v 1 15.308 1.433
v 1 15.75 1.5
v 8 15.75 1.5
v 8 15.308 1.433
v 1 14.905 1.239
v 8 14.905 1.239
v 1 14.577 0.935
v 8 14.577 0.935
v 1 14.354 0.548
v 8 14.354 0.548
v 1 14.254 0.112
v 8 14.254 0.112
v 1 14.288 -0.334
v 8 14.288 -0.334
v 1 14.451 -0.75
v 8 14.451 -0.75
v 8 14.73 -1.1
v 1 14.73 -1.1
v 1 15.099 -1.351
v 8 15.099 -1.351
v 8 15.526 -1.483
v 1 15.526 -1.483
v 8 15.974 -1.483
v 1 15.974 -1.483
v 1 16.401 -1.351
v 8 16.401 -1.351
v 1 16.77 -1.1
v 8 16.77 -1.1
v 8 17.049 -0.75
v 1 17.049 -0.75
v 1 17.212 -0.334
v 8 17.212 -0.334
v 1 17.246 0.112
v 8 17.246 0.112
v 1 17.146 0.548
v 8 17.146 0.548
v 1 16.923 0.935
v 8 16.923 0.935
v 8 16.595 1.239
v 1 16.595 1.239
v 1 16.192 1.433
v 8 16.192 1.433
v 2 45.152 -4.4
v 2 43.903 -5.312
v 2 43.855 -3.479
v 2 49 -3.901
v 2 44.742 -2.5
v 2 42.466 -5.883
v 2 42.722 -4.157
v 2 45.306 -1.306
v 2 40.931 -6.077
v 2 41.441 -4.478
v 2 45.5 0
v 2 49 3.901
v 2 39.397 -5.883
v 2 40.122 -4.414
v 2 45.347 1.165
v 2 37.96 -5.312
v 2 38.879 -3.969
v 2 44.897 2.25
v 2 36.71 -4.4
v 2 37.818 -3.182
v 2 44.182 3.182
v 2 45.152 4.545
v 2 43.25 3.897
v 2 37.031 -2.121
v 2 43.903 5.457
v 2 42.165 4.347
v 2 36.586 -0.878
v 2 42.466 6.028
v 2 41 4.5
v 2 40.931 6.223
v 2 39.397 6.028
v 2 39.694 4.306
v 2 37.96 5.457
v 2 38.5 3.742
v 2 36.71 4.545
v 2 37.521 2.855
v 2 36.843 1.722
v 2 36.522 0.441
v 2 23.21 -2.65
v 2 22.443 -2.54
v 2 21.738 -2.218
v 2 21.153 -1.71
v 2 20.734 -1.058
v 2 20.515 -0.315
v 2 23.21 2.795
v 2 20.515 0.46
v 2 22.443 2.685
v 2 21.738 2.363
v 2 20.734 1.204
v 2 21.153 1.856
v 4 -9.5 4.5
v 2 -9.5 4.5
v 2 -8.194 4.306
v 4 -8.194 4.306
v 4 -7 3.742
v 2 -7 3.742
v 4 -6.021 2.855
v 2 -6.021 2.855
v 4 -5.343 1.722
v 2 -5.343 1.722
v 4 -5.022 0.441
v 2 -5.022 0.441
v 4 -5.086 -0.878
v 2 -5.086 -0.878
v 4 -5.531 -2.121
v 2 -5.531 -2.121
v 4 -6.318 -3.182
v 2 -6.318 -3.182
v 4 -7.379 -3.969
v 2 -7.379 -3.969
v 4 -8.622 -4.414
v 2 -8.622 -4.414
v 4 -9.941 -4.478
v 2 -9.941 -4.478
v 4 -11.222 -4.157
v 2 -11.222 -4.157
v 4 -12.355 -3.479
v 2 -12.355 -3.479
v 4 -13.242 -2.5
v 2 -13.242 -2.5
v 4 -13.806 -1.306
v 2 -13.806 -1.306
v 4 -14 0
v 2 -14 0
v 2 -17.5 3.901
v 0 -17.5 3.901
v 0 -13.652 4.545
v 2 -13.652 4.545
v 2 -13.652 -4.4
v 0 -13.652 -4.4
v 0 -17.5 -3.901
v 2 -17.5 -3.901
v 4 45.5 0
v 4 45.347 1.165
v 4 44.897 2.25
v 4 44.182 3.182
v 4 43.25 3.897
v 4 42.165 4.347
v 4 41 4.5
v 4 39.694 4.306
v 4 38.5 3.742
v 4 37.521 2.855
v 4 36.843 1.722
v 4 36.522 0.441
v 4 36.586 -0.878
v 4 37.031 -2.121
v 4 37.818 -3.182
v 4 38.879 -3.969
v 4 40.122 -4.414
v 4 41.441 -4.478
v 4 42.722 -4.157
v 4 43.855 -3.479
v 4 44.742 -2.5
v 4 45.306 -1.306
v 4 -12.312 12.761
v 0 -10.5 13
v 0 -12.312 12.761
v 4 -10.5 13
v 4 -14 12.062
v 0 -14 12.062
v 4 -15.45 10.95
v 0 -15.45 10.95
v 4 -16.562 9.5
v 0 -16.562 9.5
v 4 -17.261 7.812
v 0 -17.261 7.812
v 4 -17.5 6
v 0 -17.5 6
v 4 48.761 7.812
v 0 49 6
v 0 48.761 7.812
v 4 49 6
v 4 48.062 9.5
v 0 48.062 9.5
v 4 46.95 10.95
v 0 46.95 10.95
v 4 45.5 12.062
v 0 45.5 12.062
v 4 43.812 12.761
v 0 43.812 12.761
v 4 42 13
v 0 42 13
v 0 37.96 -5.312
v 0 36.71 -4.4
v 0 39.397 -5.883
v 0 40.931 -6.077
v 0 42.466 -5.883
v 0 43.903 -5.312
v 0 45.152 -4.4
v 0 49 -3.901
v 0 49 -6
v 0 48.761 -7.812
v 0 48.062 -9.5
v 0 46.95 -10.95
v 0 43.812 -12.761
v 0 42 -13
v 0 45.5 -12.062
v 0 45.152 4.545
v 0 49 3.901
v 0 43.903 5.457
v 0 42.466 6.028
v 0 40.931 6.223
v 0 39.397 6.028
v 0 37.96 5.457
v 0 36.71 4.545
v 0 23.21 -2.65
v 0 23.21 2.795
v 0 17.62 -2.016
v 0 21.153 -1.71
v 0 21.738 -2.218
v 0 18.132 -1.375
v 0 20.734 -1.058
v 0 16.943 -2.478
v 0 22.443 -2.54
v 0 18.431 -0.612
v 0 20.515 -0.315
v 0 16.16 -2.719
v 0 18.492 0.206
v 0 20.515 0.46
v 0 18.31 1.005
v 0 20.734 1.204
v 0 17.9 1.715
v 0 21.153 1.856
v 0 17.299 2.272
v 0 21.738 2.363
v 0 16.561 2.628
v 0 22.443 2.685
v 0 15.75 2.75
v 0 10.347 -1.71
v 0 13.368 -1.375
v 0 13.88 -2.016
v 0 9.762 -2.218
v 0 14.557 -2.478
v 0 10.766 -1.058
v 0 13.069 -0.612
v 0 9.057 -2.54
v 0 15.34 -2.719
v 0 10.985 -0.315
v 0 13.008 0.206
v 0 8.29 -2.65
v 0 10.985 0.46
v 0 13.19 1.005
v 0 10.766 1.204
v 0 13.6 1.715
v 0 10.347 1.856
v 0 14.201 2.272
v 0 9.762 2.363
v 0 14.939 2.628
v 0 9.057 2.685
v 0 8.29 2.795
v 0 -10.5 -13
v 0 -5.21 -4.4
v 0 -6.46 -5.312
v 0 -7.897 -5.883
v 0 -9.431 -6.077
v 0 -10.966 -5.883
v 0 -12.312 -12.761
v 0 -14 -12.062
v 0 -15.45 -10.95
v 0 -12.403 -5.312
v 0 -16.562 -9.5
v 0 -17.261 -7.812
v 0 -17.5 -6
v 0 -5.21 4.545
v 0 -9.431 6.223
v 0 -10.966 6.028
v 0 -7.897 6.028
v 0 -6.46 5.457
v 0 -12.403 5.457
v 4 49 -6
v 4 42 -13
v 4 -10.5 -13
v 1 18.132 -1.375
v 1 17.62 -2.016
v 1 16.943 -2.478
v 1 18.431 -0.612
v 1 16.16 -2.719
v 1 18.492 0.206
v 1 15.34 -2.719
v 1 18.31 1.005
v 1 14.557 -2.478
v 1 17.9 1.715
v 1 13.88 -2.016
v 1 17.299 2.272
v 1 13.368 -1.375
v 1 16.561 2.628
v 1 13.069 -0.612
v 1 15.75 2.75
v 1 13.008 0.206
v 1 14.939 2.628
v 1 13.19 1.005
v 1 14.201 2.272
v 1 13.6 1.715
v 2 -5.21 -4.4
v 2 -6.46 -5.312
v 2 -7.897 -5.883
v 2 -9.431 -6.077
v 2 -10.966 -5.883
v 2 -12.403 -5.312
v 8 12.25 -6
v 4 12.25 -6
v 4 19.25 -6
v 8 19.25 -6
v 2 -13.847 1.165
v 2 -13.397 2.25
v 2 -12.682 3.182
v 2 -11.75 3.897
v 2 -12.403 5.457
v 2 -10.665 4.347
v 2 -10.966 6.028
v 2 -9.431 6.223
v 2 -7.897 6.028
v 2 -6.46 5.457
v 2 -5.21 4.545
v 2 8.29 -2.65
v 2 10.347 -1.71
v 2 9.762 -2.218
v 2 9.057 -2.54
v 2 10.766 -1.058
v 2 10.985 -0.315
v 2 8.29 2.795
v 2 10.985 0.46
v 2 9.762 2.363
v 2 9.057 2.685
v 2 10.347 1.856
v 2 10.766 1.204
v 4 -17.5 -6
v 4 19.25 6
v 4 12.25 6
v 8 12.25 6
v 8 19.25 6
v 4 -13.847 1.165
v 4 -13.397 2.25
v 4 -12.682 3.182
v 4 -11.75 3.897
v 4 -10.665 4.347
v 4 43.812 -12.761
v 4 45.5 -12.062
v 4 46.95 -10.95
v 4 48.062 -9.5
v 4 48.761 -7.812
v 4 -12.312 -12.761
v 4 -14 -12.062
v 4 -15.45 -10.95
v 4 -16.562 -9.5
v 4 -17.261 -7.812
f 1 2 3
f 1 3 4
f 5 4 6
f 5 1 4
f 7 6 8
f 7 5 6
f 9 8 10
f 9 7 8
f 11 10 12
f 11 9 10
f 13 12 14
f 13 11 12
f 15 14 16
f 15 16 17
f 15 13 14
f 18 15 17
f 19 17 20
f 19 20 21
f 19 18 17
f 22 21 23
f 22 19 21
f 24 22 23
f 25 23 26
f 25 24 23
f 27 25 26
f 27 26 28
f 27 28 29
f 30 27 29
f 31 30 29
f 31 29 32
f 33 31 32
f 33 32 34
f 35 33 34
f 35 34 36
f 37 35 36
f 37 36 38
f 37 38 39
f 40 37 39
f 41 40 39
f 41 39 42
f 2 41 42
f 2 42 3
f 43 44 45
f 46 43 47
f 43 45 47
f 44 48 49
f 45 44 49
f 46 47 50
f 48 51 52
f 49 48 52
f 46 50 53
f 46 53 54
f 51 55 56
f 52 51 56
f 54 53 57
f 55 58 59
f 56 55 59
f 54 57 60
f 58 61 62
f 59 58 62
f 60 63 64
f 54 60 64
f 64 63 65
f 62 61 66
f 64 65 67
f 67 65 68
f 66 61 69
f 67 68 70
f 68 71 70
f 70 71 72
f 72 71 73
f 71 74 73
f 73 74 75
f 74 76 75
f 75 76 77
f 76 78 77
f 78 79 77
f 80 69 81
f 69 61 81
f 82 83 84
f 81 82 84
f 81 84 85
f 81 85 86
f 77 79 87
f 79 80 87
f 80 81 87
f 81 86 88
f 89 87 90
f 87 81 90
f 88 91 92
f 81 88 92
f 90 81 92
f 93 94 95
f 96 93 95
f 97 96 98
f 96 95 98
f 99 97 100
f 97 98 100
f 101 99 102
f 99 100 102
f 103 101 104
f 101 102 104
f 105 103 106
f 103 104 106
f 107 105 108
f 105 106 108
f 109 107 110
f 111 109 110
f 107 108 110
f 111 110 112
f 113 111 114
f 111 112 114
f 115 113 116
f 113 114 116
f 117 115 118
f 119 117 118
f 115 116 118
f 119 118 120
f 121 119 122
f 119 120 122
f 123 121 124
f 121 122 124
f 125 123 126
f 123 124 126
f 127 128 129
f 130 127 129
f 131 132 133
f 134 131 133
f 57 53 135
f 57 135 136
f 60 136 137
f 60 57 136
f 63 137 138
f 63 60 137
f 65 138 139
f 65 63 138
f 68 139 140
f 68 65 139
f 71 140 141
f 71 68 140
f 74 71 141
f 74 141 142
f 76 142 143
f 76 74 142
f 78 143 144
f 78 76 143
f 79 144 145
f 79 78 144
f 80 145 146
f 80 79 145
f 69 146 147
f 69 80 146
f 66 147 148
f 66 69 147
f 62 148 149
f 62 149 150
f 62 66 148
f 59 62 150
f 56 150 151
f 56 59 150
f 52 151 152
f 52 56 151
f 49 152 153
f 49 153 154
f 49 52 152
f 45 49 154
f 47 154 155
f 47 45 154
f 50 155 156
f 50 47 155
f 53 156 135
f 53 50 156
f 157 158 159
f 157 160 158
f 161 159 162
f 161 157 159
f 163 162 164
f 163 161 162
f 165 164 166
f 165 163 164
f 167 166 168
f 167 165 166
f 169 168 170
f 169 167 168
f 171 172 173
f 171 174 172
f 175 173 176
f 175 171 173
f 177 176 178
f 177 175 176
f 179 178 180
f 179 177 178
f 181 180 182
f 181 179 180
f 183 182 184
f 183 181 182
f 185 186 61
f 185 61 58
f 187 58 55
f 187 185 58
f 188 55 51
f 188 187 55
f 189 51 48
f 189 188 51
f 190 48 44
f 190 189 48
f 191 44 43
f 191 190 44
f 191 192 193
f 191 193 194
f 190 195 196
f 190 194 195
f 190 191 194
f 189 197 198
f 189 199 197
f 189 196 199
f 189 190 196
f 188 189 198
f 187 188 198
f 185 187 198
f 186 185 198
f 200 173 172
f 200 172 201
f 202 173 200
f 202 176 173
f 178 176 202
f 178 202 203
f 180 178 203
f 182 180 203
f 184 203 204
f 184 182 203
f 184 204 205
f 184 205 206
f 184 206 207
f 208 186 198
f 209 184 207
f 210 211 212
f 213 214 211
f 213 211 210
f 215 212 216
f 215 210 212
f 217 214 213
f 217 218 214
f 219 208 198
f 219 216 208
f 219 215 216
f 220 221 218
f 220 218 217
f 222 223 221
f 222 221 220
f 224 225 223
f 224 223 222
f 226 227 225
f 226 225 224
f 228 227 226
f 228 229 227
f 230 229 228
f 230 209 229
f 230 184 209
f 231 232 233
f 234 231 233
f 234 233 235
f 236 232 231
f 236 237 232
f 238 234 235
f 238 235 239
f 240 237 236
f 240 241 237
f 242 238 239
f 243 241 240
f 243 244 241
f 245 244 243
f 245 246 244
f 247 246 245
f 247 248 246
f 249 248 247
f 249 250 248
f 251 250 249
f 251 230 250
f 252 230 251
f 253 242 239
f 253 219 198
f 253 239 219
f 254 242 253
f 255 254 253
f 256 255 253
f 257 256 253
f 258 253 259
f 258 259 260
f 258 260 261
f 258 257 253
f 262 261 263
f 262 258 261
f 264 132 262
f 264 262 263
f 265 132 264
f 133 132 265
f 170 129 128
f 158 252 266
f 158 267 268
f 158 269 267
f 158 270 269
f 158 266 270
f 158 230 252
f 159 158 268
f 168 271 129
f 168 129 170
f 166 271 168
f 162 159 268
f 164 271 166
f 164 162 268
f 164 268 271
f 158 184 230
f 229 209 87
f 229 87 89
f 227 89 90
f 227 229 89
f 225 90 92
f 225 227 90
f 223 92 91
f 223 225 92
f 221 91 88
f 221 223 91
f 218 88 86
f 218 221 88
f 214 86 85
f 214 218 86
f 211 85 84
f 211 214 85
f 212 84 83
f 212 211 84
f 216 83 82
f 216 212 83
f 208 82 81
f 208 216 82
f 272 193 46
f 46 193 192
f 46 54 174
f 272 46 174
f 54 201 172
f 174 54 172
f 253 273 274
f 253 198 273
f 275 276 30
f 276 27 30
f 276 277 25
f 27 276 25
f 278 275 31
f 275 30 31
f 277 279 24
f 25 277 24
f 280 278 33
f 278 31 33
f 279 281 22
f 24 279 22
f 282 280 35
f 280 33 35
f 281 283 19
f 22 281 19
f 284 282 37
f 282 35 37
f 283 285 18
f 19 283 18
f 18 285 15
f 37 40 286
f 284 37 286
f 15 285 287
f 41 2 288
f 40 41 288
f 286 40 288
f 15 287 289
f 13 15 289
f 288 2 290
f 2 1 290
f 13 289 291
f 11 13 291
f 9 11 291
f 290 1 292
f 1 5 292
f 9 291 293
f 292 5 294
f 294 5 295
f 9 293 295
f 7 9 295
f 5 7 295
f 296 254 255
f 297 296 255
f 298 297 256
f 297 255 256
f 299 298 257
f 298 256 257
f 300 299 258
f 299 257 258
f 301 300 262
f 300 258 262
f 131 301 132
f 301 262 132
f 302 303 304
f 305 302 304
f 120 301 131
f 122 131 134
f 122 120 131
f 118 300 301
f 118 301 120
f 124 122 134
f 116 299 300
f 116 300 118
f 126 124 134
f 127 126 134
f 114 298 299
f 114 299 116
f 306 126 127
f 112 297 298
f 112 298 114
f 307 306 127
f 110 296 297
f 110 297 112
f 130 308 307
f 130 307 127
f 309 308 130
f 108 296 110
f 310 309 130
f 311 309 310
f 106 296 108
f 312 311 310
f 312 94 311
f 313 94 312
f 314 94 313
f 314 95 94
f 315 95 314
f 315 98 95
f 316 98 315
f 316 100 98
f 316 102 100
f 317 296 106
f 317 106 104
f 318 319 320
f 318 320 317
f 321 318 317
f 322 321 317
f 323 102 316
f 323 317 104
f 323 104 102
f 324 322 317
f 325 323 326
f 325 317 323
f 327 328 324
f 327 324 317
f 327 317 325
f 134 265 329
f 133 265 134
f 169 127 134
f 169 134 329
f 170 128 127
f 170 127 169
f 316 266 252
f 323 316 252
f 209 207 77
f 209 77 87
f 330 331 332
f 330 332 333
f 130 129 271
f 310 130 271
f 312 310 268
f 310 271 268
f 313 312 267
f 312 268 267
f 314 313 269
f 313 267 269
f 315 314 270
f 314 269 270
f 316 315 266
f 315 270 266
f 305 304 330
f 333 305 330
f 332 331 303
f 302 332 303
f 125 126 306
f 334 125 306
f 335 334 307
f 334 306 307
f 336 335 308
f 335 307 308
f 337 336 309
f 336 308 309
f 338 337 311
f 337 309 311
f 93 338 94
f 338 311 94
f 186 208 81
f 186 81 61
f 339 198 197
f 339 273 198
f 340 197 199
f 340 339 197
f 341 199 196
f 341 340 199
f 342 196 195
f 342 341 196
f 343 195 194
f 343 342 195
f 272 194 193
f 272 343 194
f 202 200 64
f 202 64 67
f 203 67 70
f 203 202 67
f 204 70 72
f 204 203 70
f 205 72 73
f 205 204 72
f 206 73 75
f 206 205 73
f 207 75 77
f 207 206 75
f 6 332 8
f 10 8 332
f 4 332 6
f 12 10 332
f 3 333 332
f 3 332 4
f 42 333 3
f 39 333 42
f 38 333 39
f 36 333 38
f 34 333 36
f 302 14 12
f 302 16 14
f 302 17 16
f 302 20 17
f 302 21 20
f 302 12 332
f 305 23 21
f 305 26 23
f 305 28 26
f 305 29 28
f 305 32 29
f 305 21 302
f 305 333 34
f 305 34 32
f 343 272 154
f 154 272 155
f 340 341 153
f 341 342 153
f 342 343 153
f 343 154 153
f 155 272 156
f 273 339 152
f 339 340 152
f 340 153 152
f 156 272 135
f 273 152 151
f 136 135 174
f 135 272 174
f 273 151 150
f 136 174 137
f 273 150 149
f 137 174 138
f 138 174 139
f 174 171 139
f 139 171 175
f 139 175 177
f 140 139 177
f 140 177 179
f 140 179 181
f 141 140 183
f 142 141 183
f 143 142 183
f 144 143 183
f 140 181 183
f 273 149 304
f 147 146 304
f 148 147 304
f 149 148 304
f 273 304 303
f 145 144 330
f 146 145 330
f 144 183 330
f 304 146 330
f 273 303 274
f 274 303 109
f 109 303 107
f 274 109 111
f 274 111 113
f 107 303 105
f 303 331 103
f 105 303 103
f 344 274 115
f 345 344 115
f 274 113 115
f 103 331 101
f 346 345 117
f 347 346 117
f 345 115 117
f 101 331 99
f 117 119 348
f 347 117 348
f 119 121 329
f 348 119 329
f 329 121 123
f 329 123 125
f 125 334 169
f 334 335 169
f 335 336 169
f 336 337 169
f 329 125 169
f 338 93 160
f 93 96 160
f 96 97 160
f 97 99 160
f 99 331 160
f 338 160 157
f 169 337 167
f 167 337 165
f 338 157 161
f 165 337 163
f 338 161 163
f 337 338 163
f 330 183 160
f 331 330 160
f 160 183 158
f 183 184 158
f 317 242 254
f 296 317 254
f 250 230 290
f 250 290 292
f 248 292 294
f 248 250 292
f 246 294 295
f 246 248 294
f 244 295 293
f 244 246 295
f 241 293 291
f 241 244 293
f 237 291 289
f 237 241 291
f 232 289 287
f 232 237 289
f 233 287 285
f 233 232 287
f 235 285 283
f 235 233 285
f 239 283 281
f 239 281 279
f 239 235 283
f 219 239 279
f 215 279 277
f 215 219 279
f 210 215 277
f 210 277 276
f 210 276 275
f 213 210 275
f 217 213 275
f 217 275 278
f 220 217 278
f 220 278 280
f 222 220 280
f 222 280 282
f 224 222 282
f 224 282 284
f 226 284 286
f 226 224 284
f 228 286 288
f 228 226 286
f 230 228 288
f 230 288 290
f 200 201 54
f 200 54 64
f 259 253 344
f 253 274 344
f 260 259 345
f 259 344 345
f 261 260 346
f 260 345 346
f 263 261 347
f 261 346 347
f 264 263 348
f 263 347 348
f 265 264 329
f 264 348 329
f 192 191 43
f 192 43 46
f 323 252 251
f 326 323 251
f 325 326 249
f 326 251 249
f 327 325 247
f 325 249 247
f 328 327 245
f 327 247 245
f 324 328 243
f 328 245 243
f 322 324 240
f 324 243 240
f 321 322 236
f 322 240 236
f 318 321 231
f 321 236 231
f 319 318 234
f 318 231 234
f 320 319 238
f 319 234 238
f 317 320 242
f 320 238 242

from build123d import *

# Parameters (mm, degrees)
SKETCH_1_W             = 36.75
SKETCH_1_H             = 26
EXTRUDE_1_DEPTH        = 4
CUT_EXTRUDE_1_DEPTH    = 2
FILLET_1_R             = 7
CUT_EXTRUDE_3_DEPTH    = 2
SKETCH_11_W            = 12
SKETCH_11_H            = 7
EXTRUDE_2_DEPTH        = 4
SKETCH_12_R            = 1.5
CUT_EXTRUDE_4_DEPTH    = 8
SKETCH_13_R            = 2.75
CUT_EXTRUDE_5_DEPTH    = 1
FILLET_1_OF_MIRROR_2_R = 7


with BuildPart() as part:
    # Эскиз1 → Бобышка-Вытянуть1 (new body)
    with BuildSketch(Plane(origin=(0, 0, 0), x_dir=(0, -1, 0), z_dir=(-1, 0, 0))):
        with Locations((-0.875, 0)):
            Rectangle(SKETCH_1_W, SKETCH_1_H)
    extrude_1 = extrude(amount=-EXTRUDE_1_DEPTH)

    # Эскиз2 → Вырез-Вытянуть1 (cut)
    with BuildSketch(Plane.ZY):
        with BuildLine():
            Line((3.901238196, -17.5), (4.545454545, -13.652408939))
            ThreePointArc((4.545454545, -13.652408939), (6.222727273, -9.431365141), (4.545454545, -5.210321344))
            Line((4.545454545, -5.210321344), (2.795454545, 8.289678656))
            ThreePointArc((2.795454545, 8.289678656), (0.072727273, 11.012405929), (-2.65, 8.289678656))
            Line((-2.65, 8.289678656), (-4.4, -5.210321344))
            ThreePointArc((-4.4, -5.210321344), (-6.077272727, -9.431365141), (-4.4, -13.652408939))
            Line((-4.4, -13.652408939), (-3.901238196, -17.5))
            Line((-3.901238196, -17.5), (3.901238196, -17.5))
        make_face()
    cut_extrude_1 = extrude(amount=-CUT_EXTRUDE_1_DEPTH, mode=Mode.SUBTRACT)

    # Скругление1
    fillet_1_edges = [part.edges().sort_by_distance(p)[0] for p in [
        (2, -17.5, 13),
        (2, -17.5, -13),
    ]]
    fillet(fillet_1_edges, radius=FILLET_1_R)

    # Эскиз9 → Вырез-Вытянуть3 (cut)
    with BuildSketch(Plane.ZY.offset(-2)):
        with BuildLine():
            ThreePointArc((4.5, -9.5), (-3.181980515, -6.318019485), (0, -14))
            Line((0, -14), (0, -9.5))
            Line((0, -9.5), (4.5, -9.5))
        make_face()
        with BuildLine():
            Line((0, -9.5), (0, -14))
            ThreePointArc((0, -14), (3.181980515, -12.681980515), (4.5, -9.5))
            Line((4.5, -9.5), (0, -9.5))
        make_face()
    cut_extrude_3 = extrude(amount=-CUT_EXTRUDE_3_DEPTH, mode=Mode.SUBTRACT)

    # Эскиз11 → Бобышка-Вытянуть2 (add)
    with BuildSketch(Plane(origin=(4, 0, 0), x_dir=(0, 0, -1), z_dir=(1, 0, 0))):
        with Locations((0, 15.75)):
            Rectangle(SKETCH_11_W, SKETCH_11_H)
    extrude_2 = extrude(amount=EXTRUDE_2_DEPTH)

    # Эскиз12 → Вырез-Вытянуть4 (cut)
    with BuildSketch(Plane.ZY):
        with Locations((0, 15.75)):
            Circle(SKETCH_12_R)
    cut_extrude_4 = extrude(amount=-CUT_EXTRUDE_4_DEPTH, mode=Mode.SUBTRACT)

    # Эскиз13 → Вырез-Вытянуть5 (cut)
    with BuildSketch(Plane.ZY):
        with Locations((0, 15.75)):
            Circle(SKETCH_13_R)
    cut_extrude_5 = extrude(amount=-CUT_EXTRUDE_5_DEPTH, mode=Mode.SUBTRACT)

    # Зеркальное отражение2: Бобышка-Вытянуть1, Вырез-Вытянуть1, Вырез-Вытянуть3, Бобышка-Вытянуть2, Вырез-Вытянуть4, Вырез-Вытянуть5 across plane
    add(extrude_1.mirror(Plane.ZX.offset(15.75)))
    add(cut_extrude_1.mirror(Plane.ZX.offset(15.75)), mode=Mode.SUBTRACT)
    add(cut_extrude_3.mirror(Plane.ZX.offset(15.75)), mode=Mode.SUBTRACT)
    add(extrude_2.mirror(Plane.ZX.offset(15.75)))
    add(cut_extrude_4.mirror(Plane.ZX.offset(15.75)), mode=Mode.SUBTRACT)
    add(cut_extrude_5.mirror(Plane.ZX.offset(15.75)), mode=Mode.SUBTRACT)

    # Скругление1 of Зеркальное отражение2
    fillet_1_of_mirror_2_edges = [part.edges().sort_by_distance(p)[0] for p in [
        (2, 49, 13),
        (2, 49, -13),
    ]]
    fillet(fillet_1_of_mirror_2_edges, radius=FILLET_1_OF_MIRROR_2_R)


solid = part.part
